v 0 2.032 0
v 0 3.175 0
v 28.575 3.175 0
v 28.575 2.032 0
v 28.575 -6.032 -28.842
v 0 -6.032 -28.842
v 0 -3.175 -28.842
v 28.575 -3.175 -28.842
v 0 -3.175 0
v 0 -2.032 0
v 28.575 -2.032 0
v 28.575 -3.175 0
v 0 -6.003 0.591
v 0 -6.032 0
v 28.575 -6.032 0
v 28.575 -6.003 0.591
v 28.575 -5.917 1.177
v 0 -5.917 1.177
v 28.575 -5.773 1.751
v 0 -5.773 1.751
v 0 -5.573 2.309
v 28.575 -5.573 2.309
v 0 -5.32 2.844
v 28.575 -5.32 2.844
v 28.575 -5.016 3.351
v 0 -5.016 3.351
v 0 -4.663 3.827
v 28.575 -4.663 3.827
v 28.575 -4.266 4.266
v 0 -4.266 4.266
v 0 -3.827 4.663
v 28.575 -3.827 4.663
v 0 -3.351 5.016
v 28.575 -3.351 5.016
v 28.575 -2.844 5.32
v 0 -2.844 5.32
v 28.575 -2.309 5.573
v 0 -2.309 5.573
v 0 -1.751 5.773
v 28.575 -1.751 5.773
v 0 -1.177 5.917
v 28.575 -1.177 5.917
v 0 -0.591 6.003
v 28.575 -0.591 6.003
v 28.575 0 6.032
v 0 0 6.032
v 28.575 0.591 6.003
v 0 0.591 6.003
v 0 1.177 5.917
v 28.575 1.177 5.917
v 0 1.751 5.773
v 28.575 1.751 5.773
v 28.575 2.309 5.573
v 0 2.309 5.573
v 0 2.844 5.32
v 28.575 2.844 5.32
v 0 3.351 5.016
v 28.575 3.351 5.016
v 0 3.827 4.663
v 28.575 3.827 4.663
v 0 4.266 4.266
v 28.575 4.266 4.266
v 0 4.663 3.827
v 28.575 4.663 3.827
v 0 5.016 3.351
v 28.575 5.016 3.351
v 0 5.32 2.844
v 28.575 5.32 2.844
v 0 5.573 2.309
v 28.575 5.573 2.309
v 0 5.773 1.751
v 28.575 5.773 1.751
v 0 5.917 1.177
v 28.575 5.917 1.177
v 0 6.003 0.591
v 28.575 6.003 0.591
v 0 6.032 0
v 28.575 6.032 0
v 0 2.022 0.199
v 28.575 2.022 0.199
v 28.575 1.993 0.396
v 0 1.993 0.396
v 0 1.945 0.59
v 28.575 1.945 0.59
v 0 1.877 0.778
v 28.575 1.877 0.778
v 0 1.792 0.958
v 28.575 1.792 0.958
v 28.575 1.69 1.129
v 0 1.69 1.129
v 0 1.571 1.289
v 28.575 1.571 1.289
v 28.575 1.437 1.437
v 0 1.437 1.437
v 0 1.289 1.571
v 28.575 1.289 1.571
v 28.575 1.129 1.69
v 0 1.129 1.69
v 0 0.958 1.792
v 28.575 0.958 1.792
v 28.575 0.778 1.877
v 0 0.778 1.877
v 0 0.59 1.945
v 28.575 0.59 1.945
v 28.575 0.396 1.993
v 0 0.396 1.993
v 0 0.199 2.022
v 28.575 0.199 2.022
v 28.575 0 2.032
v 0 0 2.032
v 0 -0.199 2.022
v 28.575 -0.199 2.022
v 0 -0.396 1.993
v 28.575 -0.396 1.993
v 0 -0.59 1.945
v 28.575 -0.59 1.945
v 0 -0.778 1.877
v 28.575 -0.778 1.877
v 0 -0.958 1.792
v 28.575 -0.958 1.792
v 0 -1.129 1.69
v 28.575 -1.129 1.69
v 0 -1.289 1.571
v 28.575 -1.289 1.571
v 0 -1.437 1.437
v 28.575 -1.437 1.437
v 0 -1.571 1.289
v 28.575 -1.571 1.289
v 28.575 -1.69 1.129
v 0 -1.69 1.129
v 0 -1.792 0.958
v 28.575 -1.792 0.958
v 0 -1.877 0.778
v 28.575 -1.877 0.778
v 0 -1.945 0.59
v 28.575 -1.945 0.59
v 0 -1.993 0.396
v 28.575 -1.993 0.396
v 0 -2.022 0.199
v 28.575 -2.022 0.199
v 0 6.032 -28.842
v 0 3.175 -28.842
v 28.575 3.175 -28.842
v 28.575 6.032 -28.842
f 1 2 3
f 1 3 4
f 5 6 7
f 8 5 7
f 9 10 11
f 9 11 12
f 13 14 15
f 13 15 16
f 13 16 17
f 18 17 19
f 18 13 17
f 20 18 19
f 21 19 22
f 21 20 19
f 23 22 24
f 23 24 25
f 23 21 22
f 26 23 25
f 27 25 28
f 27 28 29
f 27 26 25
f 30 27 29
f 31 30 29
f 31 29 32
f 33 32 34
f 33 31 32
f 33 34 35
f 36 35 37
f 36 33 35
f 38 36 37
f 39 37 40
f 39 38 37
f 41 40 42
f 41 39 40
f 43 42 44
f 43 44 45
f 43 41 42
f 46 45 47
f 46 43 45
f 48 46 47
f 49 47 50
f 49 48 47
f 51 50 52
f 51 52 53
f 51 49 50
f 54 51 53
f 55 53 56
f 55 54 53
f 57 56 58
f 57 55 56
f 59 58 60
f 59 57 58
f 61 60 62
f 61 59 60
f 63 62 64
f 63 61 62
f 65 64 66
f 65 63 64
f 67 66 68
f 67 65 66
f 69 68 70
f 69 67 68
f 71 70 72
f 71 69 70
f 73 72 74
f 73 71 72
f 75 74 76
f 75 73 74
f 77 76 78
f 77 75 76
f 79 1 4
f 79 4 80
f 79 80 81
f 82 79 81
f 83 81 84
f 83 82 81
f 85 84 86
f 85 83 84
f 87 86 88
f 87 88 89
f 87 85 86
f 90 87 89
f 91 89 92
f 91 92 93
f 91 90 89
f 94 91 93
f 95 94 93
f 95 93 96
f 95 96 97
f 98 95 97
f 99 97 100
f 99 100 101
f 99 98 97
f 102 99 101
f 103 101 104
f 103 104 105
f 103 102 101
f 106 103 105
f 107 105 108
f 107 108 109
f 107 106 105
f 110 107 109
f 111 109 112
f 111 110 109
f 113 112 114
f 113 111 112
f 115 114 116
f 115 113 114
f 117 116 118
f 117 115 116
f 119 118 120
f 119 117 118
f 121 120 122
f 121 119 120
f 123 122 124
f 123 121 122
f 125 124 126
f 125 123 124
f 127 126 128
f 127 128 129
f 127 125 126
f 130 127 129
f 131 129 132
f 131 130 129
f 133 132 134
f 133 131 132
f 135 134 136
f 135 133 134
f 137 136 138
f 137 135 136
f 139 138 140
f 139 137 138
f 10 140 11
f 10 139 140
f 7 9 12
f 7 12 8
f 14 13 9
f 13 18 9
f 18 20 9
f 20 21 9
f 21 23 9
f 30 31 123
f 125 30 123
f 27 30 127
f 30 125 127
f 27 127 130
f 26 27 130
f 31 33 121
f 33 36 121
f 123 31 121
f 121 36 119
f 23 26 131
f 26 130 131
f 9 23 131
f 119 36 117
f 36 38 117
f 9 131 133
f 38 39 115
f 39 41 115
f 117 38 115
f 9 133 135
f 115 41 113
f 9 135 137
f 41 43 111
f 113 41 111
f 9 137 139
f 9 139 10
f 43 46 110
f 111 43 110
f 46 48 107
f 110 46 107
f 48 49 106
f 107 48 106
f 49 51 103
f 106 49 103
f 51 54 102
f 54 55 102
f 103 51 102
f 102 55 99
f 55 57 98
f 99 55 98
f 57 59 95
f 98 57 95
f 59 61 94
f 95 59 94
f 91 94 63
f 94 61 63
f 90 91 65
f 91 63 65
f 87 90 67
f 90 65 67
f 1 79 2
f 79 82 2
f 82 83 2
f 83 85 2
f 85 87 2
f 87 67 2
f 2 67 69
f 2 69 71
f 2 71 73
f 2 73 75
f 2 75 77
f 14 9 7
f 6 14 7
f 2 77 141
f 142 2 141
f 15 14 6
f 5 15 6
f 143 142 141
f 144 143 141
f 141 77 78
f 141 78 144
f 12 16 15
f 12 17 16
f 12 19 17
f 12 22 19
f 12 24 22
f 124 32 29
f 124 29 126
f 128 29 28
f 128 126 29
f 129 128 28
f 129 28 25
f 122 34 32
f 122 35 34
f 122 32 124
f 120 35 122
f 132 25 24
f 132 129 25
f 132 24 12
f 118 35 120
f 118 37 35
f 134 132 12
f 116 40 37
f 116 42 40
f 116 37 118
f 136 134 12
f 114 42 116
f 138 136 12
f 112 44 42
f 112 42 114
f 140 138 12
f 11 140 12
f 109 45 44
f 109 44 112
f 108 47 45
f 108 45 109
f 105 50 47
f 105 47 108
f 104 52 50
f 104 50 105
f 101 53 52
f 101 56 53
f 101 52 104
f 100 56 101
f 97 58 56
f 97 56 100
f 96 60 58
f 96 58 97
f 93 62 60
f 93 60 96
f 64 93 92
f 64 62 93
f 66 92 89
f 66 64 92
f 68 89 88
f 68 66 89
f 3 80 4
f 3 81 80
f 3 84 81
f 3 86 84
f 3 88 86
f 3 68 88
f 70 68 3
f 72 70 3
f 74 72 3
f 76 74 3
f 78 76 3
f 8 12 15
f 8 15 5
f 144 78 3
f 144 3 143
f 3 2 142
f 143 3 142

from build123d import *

# Parameters (mm, degrees)
SKETCH1_W           = 28.8417
SKETCH1_H           = 2.8575
BOSS_EXTRUDE1_DEPTH = 28.575


with BuildPart() as part:
    # Sketch1 → Boss-Extrude1 (new body)
    with BuildSketch(Plane(origin=(0, 0, 0), x_dir=(0, 0, -1), z_dir=(1, 0, 0))):
        with Locations((14.42085, 4.60375)):
            Rectangle(SKETCH1_W, SKETCH1_H)
        with BuildLine():
            ThreePointArc((0, 2.032), (-2.032, 0), (0, -2.032))
            Line((0, -2.032), (0, -6.0325))
            ThreePointArc((0, -6.0325), (-6.0325, 0), (0, 6.0325))
            Line((0, 6.0325), (0, 2.032))
        make_face()
        with Locations((14.42085, -4.60375)):
            Rectangle(SKETCH1_W, SKETCH1_H)
    extrude(amount=BOSS_EXTRUDE1_DEPTH)


solid = part.part
